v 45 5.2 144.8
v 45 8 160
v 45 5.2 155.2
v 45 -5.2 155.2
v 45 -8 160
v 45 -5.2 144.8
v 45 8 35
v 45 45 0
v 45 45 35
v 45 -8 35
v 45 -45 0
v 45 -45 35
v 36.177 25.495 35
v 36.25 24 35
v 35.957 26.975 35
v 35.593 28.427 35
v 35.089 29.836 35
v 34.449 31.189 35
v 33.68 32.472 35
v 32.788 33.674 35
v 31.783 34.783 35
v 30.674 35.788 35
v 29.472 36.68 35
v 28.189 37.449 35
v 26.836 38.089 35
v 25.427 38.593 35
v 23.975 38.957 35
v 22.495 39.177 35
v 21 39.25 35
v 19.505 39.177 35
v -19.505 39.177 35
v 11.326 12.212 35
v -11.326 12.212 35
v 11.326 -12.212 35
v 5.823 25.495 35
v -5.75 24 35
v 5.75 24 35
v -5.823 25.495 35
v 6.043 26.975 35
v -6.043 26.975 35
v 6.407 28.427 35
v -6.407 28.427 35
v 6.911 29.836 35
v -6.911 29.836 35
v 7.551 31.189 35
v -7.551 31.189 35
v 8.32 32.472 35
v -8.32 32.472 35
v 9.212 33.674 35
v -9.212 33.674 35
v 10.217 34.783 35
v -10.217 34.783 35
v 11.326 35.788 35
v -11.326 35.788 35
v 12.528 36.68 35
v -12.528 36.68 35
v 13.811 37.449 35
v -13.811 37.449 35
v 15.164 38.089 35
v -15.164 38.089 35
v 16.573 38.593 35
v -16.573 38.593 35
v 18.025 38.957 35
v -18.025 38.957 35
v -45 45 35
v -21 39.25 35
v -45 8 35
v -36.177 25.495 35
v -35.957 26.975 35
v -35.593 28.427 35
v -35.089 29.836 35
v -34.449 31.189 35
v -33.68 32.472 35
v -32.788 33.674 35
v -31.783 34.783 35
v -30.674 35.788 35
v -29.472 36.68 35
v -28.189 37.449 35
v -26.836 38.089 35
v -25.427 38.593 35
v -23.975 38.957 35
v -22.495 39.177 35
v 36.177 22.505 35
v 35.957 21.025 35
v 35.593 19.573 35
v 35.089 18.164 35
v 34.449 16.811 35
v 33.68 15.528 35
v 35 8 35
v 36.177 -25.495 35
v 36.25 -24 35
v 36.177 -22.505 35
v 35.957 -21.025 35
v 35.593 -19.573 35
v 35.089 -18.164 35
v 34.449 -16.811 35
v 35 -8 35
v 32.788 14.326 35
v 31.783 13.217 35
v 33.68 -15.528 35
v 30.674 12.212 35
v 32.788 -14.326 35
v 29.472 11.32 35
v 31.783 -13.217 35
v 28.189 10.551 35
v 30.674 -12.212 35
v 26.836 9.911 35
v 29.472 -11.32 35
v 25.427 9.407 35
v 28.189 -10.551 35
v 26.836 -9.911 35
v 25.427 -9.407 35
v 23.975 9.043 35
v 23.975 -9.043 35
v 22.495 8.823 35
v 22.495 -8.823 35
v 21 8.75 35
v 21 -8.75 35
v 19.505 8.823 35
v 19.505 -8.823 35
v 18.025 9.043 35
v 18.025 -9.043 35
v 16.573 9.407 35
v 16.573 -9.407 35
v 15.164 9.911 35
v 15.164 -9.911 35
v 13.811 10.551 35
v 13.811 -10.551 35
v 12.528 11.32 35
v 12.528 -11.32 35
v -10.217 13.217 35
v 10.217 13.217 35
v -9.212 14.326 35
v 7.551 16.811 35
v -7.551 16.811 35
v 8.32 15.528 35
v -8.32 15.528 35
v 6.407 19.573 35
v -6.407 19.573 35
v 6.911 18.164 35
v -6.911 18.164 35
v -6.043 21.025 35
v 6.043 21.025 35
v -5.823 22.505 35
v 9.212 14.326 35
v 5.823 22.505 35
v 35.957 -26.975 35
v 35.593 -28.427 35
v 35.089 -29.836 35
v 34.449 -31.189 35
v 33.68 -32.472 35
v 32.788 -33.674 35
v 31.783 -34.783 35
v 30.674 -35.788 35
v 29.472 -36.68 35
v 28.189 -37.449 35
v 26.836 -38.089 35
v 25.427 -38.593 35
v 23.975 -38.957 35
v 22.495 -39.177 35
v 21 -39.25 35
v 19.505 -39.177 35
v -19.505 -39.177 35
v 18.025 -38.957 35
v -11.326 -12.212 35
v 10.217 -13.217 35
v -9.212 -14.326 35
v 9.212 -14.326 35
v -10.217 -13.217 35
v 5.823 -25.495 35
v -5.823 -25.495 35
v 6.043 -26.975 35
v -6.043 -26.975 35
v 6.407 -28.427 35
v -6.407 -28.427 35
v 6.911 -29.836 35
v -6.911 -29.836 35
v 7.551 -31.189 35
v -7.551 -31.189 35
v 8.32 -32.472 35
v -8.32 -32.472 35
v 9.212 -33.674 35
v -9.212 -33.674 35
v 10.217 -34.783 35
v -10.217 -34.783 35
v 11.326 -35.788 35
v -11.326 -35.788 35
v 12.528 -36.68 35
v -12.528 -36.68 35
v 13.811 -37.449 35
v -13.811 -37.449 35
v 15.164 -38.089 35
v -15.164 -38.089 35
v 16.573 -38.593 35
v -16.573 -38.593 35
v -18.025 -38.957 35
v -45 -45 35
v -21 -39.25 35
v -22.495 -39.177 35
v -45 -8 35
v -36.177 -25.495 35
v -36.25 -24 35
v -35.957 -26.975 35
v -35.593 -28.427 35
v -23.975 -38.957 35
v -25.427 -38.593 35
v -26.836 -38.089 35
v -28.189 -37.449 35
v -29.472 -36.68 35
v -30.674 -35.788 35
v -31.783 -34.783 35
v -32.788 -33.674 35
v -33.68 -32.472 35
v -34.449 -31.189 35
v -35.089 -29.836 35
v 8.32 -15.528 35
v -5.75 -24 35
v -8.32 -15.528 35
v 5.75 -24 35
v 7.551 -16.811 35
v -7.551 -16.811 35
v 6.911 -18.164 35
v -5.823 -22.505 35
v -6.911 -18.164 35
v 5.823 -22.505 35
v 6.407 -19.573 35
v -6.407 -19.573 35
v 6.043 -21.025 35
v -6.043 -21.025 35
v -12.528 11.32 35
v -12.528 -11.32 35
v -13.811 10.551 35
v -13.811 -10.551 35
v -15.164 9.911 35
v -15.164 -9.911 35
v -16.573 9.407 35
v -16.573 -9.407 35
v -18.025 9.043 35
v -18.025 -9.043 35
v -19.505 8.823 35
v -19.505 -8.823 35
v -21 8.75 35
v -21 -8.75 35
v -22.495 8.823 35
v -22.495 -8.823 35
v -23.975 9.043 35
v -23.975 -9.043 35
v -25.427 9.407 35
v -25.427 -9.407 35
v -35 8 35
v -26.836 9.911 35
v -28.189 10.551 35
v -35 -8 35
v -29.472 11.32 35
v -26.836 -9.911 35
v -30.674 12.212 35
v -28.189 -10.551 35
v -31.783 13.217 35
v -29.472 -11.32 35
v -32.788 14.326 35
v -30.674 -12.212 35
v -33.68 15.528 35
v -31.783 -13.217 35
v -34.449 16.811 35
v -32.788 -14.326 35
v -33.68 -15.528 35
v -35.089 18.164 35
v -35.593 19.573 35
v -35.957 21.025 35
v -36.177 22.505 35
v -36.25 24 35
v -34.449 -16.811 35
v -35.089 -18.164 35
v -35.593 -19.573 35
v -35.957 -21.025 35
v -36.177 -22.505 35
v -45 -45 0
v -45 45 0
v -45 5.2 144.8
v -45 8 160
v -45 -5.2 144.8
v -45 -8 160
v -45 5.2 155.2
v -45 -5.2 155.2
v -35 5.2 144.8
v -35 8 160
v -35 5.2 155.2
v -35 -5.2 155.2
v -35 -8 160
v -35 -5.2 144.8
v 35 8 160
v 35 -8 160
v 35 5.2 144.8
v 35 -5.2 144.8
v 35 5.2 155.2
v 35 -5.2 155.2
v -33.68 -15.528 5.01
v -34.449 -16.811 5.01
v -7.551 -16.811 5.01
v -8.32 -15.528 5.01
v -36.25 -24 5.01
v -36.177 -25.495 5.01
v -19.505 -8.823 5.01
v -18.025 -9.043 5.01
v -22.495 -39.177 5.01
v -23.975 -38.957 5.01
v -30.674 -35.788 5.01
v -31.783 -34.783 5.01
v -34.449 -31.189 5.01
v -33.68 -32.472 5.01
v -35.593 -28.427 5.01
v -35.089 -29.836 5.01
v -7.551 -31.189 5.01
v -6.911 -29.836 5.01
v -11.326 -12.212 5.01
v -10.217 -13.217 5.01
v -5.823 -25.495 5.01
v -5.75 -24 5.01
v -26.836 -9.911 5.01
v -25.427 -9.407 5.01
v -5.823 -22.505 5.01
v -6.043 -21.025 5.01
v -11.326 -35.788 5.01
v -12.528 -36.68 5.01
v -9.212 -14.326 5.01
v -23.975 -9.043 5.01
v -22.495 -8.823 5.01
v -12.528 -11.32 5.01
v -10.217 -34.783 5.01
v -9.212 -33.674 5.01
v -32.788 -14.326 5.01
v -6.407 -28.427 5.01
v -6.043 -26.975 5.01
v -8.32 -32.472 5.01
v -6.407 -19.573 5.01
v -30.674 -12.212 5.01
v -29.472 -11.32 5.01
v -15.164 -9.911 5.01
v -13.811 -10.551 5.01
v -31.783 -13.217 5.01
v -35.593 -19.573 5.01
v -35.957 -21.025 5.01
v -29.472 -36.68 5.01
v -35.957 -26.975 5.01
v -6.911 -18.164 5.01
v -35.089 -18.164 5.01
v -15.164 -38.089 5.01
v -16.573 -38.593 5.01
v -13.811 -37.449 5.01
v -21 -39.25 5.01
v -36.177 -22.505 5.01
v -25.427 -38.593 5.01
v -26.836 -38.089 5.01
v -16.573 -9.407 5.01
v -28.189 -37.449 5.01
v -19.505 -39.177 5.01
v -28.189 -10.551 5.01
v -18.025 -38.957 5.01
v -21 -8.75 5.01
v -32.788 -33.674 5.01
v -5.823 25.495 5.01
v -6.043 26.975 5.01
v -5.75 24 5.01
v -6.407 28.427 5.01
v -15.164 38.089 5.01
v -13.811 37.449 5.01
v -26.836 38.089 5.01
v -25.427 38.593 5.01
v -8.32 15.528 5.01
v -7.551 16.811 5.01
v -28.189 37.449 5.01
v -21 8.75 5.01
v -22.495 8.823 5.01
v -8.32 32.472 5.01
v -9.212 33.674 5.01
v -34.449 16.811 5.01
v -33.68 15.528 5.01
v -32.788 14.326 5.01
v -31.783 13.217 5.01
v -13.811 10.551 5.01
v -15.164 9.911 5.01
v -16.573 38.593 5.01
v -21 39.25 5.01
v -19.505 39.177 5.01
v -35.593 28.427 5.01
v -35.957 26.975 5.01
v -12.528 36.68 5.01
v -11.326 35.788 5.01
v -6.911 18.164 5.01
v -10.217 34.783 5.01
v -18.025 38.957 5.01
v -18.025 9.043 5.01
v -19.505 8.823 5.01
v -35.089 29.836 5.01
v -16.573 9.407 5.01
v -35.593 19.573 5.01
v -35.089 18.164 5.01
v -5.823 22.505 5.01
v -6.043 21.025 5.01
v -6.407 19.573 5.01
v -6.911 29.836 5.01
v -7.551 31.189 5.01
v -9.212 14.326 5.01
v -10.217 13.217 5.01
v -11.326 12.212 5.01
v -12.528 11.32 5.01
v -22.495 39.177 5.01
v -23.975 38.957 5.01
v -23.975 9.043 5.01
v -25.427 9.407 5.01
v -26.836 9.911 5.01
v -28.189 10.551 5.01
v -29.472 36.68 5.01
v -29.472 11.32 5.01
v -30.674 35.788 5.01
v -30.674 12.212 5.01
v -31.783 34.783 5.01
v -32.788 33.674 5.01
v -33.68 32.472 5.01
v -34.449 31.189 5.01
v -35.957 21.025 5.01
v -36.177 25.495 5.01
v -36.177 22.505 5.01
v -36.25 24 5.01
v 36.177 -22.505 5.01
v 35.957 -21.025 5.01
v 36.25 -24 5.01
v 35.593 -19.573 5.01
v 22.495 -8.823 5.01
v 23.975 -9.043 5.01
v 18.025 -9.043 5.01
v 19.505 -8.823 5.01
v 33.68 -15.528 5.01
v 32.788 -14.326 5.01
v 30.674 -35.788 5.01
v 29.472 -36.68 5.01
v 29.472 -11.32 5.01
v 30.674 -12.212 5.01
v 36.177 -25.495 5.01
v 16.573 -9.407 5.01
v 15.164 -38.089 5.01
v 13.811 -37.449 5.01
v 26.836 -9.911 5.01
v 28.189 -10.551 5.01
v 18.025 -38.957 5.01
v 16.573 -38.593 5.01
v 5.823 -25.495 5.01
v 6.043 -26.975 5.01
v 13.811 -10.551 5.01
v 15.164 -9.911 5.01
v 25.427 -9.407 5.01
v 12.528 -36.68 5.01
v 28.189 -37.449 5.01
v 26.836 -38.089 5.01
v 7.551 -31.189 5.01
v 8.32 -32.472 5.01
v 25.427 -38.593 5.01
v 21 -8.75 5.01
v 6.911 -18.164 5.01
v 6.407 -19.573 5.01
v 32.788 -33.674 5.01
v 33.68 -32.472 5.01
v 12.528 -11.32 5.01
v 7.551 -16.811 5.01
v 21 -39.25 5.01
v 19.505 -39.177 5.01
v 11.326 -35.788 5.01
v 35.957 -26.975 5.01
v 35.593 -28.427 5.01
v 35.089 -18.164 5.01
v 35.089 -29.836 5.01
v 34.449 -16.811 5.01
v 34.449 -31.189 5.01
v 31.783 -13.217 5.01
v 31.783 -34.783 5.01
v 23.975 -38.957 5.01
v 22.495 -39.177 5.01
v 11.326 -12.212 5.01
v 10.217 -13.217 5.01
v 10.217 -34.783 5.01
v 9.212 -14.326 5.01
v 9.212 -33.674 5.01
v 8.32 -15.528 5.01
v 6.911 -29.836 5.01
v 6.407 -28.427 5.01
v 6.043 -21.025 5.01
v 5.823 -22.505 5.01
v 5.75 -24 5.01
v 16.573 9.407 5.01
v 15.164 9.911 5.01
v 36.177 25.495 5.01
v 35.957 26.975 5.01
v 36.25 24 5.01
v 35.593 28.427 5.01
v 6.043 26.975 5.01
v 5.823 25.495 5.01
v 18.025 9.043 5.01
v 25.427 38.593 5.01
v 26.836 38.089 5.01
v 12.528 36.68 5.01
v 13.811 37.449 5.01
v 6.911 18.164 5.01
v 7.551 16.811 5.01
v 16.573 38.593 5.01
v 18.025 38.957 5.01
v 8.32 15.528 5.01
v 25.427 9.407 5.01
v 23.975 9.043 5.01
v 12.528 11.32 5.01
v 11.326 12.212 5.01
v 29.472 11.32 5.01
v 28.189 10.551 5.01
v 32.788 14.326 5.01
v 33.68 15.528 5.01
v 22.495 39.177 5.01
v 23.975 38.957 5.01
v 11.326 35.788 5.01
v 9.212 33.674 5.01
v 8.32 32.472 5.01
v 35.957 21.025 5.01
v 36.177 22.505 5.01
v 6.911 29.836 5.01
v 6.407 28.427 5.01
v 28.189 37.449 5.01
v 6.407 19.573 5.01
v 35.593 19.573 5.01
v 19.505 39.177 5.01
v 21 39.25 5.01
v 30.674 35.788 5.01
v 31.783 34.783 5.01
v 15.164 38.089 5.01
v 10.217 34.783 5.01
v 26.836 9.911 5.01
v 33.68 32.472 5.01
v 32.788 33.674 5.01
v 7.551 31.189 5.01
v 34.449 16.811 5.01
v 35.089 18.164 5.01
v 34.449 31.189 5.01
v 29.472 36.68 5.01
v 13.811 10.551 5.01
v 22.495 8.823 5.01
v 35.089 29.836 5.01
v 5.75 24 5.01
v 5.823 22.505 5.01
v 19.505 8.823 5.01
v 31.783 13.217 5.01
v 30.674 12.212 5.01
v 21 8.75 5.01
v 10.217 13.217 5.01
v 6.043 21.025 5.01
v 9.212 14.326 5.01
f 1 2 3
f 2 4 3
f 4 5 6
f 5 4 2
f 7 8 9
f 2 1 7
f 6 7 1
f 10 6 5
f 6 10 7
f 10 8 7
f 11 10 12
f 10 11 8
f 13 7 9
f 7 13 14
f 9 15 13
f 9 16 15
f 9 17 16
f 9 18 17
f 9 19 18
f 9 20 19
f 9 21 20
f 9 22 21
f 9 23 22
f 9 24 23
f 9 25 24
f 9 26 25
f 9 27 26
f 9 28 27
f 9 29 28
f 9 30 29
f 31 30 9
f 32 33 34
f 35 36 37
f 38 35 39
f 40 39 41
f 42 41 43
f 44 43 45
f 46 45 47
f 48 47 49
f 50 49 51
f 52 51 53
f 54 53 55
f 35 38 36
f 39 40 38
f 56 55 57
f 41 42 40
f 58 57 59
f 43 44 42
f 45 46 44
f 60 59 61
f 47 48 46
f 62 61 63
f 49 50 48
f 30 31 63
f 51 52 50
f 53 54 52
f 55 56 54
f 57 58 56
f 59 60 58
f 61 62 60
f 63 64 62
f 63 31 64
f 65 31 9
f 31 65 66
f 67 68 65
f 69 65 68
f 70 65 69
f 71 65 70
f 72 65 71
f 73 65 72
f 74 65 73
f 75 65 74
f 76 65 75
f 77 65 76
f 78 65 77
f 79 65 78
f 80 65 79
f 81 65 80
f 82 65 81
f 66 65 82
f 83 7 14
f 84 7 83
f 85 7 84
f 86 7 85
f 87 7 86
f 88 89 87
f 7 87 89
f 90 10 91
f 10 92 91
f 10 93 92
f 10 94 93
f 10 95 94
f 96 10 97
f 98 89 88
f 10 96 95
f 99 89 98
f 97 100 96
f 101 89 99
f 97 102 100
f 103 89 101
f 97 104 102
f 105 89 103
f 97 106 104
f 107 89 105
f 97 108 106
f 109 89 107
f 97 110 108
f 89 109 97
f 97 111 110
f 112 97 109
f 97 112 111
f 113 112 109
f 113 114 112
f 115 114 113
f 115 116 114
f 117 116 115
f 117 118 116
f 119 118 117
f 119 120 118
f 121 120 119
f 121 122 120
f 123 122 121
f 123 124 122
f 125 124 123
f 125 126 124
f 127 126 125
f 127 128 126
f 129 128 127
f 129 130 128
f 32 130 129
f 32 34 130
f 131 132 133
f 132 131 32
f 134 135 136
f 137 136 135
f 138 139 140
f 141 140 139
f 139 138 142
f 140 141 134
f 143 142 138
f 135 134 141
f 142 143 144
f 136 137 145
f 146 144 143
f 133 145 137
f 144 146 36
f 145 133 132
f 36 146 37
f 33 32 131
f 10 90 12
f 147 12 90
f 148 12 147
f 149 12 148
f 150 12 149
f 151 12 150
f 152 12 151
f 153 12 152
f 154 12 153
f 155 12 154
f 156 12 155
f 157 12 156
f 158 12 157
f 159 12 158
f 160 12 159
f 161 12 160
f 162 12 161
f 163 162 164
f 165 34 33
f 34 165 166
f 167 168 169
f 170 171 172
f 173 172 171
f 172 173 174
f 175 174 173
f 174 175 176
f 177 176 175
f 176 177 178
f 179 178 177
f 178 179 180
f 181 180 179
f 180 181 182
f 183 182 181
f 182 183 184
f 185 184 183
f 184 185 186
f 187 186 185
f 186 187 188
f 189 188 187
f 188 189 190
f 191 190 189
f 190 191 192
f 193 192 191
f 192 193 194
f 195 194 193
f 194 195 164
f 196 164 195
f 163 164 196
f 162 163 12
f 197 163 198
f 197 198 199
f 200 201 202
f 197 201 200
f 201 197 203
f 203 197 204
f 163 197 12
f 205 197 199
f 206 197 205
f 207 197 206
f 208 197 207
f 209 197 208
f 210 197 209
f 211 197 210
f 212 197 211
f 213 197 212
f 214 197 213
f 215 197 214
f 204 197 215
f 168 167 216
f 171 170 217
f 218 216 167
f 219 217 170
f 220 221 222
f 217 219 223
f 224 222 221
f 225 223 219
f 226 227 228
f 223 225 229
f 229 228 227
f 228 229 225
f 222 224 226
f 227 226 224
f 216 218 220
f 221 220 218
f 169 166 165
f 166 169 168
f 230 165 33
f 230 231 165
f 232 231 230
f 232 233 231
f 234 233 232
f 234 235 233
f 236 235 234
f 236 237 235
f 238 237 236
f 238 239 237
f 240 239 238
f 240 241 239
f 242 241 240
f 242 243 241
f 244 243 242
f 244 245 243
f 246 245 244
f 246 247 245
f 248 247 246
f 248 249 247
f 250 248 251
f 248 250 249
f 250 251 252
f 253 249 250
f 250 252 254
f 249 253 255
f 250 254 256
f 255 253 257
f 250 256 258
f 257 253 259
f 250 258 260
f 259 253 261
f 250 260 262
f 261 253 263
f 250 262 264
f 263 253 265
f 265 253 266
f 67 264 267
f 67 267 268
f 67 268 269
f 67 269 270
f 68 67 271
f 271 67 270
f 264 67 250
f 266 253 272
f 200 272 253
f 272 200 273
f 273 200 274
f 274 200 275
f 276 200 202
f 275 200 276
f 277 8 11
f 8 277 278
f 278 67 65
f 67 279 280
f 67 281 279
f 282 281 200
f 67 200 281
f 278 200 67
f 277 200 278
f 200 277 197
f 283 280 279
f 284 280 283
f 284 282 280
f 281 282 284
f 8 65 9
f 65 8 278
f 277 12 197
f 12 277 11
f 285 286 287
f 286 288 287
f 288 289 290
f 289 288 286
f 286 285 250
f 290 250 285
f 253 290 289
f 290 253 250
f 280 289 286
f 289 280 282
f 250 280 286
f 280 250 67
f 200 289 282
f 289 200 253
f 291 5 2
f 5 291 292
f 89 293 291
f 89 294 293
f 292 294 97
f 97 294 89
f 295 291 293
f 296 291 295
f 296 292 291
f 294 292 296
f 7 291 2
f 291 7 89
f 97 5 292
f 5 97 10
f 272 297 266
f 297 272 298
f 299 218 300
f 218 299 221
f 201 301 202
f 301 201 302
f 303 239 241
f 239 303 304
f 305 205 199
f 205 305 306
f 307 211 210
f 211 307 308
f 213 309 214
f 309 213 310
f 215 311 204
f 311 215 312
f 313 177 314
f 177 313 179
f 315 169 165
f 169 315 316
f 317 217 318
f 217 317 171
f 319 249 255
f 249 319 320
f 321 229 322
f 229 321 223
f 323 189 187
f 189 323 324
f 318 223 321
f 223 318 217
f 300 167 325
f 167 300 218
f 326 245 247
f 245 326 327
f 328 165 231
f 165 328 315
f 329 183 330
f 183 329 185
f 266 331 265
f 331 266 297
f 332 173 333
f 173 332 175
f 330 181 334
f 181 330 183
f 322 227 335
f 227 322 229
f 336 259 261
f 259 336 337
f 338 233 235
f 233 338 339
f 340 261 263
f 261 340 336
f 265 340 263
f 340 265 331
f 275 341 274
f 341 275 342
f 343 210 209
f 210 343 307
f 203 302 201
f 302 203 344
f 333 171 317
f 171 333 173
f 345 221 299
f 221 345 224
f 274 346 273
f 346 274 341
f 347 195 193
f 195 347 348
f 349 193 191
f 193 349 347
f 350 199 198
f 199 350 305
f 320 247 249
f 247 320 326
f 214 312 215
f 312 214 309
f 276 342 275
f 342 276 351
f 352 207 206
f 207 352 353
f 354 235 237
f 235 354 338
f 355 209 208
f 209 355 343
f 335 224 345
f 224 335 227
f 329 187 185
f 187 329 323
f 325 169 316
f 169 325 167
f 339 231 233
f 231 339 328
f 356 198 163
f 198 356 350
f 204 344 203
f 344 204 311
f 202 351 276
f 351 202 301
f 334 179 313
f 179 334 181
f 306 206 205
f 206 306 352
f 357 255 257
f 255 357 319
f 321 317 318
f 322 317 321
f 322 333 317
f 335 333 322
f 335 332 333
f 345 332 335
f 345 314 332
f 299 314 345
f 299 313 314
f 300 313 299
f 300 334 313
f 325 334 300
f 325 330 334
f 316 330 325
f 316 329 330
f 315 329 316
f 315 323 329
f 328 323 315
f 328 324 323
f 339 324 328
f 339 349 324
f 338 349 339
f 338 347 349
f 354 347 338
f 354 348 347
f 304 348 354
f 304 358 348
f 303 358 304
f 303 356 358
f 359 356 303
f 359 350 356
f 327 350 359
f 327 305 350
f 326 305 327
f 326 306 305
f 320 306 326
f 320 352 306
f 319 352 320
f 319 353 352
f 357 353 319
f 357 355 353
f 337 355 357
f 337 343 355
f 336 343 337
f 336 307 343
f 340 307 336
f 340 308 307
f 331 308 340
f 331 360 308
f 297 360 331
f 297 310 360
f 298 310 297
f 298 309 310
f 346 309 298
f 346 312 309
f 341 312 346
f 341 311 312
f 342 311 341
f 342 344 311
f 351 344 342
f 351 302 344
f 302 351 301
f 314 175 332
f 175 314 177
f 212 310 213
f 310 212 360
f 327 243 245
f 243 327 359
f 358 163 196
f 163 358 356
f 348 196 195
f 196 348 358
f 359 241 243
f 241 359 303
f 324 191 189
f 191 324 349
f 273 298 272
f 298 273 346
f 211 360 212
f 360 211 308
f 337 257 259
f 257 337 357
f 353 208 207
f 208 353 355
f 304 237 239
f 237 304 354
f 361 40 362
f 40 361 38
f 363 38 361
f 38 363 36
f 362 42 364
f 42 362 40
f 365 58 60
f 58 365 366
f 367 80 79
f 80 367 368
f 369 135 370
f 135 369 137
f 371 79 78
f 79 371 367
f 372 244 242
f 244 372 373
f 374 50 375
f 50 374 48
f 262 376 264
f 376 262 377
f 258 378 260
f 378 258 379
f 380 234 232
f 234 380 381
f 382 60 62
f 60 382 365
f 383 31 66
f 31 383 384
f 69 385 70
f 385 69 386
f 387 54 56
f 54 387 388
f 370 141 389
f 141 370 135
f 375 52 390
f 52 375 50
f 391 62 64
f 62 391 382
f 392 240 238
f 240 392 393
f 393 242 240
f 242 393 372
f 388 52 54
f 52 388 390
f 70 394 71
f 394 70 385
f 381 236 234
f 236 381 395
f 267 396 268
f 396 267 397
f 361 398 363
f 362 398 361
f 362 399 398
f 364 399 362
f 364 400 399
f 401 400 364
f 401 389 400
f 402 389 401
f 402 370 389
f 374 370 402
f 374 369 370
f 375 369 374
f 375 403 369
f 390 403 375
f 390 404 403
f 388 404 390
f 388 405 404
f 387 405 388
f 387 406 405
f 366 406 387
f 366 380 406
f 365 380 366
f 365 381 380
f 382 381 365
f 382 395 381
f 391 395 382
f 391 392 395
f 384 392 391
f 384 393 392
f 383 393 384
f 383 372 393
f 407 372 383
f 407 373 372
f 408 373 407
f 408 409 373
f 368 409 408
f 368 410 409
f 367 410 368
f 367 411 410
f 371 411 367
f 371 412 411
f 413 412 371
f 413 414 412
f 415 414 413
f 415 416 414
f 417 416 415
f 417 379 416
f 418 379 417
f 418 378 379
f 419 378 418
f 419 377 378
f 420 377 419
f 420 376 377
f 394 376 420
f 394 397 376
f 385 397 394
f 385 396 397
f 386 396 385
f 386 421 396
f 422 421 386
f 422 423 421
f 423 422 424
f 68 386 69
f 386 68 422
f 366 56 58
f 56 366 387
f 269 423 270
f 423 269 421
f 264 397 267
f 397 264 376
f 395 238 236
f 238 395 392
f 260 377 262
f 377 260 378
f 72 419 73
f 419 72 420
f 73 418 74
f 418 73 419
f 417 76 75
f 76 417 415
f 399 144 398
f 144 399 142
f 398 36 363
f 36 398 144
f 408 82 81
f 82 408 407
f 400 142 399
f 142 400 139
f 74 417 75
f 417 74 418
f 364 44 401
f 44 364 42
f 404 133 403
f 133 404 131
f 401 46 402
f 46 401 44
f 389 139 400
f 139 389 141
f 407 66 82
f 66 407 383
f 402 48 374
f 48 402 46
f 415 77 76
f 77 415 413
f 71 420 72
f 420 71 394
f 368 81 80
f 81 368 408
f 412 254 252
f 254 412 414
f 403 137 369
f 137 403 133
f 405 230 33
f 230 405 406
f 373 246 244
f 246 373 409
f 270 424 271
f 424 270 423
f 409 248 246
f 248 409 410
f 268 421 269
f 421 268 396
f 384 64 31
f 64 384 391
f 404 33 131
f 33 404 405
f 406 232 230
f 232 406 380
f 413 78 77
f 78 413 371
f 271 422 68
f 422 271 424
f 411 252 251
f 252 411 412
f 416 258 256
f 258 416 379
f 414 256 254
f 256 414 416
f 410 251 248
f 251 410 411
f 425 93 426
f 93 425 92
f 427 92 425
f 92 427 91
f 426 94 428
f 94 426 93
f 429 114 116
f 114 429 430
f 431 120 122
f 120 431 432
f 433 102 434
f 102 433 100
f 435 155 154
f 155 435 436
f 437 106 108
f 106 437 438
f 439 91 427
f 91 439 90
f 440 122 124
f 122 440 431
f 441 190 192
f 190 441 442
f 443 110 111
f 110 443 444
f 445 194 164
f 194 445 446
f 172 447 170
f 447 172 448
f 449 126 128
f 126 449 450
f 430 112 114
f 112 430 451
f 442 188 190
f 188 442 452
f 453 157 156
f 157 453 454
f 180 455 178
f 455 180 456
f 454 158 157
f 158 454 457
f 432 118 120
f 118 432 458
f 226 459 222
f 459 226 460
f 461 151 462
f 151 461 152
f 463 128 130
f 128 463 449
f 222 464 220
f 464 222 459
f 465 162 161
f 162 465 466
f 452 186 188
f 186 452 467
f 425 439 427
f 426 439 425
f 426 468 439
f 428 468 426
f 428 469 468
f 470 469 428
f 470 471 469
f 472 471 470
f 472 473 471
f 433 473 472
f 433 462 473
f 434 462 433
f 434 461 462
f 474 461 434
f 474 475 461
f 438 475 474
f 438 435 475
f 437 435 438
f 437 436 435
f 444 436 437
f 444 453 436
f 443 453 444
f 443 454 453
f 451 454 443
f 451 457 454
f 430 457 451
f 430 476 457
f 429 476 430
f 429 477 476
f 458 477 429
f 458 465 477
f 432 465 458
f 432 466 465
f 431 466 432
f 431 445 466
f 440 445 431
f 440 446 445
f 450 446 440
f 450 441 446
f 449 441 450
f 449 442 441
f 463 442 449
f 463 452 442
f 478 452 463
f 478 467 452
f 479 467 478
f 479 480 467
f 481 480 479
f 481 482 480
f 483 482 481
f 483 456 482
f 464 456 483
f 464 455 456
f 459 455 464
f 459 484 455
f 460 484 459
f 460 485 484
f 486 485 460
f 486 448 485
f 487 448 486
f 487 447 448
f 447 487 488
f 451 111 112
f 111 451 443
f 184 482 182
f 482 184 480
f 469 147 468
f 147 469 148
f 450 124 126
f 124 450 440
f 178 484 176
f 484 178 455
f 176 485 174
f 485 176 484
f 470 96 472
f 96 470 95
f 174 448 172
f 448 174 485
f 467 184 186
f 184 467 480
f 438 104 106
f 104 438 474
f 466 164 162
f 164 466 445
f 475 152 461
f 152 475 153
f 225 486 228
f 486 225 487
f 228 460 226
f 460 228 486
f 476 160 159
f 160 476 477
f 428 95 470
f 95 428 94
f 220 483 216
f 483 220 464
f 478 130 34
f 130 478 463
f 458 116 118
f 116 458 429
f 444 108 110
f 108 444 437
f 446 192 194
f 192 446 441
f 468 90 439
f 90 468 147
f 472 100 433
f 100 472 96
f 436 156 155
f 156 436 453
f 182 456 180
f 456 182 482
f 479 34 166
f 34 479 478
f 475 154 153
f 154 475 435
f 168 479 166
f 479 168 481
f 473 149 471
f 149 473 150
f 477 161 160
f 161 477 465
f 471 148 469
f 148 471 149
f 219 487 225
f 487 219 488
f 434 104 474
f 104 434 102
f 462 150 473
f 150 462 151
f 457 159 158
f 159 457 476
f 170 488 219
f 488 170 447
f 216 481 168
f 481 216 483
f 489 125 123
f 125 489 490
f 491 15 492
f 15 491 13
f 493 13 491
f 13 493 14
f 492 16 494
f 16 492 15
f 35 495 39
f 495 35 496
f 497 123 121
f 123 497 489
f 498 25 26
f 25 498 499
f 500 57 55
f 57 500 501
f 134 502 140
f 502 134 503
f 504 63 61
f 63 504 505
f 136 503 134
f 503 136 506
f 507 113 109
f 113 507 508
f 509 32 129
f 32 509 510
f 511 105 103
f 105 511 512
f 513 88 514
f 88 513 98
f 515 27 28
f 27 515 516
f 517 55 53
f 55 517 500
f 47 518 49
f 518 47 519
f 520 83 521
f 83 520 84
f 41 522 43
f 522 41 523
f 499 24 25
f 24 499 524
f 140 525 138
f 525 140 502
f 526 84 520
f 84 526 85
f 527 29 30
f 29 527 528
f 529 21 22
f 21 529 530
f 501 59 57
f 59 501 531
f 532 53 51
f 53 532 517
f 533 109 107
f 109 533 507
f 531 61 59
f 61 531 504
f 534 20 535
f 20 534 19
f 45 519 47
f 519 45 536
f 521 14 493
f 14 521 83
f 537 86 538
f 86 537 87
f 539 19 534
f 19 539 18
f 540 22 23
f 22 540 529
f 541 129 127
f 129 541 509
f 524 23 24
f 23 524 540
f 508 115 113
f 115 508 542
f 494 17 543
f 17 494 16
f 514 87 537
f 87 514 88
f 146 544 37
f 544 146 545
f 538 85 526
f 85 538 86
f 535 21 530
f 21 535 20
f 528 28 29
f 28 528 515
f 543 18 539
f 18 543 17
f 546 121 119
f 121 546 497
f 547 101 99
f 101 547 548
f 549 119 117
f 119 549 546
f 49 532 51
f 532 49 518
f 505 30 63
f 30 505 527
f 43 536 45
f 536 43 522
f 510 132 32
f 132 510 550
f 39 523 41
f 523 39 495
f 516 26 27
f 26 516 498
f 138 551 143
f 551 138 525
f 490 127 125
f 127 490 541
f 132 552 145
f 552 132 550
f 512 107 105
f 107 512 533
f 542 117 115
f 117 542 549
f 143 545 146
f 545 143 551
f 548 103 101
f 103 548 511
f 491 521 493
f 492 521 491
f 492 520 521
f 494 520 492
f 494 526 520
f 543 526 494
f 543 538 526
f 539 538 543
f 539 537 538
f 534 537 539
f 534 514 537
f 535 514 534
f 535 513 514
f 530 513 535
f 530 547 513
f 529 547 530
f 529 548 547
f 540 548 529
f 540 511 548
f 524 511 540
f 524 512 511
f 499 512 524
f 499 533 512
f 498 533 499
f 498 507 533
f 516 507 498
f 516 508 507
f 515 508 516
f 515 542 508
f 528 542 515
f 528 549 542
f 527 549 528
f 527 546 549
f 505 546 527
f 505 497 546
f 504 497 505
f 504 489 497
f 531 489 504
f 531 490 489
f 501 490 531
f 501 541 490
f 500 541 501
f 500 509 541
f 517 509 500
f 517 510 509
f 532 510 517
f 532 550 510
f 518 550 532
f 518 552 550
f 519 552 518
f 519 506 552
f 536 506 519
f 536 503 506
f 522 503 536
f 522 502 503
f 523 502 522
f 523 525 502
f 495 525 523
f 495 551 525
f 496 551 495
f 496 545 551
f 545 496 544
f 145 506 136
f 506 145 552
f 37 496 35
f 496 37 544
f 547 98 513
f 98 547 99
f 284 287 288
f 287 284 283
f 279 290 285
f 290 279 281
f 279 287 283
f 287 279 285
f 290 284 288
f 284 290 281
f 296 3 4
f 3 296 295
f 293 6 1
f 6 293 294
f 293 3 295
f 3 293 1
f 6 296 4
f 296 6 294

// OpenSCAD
// Part 1: Base block with tube seats and vertical posts
// Part 2: Handle bar to be slid through the posts

// --- Dimensions Part 1 ---
base_x      = 90;    // Base length (X)
base_y      = 90;    // Base width (Y)
base_z      = 35;    // Base height (Z)

seat_d      = 30.5;  // Diameter of tube seats
seat_depth  = 30;    // Depth of tube seats
seat_floor  = 5;     // Remaining floor thickness (35 - 30)

seat_x_pos  = 21;    // X offset for seats
seat_y_pos  = 24;    // Y offset for seats

post_x_thick = 10;   // Thickness of posts (X dimension)
post_y_wide  = 16;   // Width of posts (Y dimension)
post_z_total  = 160; // Total height from Z=0

hole_sq_d    = 10.4; // Square hole dimension
hole_sq_z    = 150;  // Z height of the square hole center

// --- Dimensions Part 2 ---
handle_x     = 100;  // Length of handle (X)
handle_w     = 10;   // Width of handle (Y)
handle_h     = 10;   // Height of handle (Z)
handle_y_min  = 55;  // Y position start (55 to 65)
handle_y_max  = 65;

$fn = 64;

// --- Part 1: Base and Posts ---
module part_1() {
    difference() {
        union() {
            // Main Base Block
            translate([-base_x/2, -base_y/2, 0])
                cube([base_x, base_y, base_z]);
            
            // Post 1 (at -X end)
            // Positioned flush with end faces: X from -45 to -35
            translate([-base_x/2, -post_y_wide/2, base_z])
                cube([post_x_thick, post_y_wide, post_z_total - base_z]);
            
            // Post 2 (at +X end)
            // Positioned flush with end faces: X from 35 to 45
            translate([base_x/2 - post_x_thick, -post_y_wide/2, base_z])
                cube([post_x_thick, post_y_wide, post_z_total - base_z]);
        }

        // Tube Seats (Blind holes)
        // Seats are centered at x = +/- 21, y = +/- 24
        for (sx = [-seat_x_pos, seat_x_pos]) {
            for (sy = [-seat_y_pos, seat_y_pos]) {
                // Subtract 0.01 to ensure clean cut through the top face
                translate([sx, sy, base_z - seat_depth + 0.01])
                    cylinder(h = seat_depth + 0.02, d = seat_d);
            }
        }

        // Square holes through posts
        // Centered at z = 150.
        // Post 1 X range: [-45, -35]. Post 2 X range: [35, 45].
        
        // Hole 1 (Left Post)
        translate([-base_x/2 - 1, -hole_sq_d/2, hole_sq_z - hole_sq_d/2])
            cube([post_x_thick + 2, hole_sq_d, hole_sq_d]);
            
        // Hole 2 (Right Post)
        translate([base_x/2 - post_x_thick - 1, -hole_sq_d/2, hole_sq_z - hole_sq_d/2])
            cube([post_x_thick + 2, hole_sq_d, hole_sq_d]);
    }
}

// --- Part 2: Handle ---
module part_2() {
    // The handle is a 10x10x100 bar.
    // It is centered on X (0), and spans Y from 55 to 65.
    // It lies on the bed (Z=0).
    translate([-handle_x/2, handle_y_min, 0])
        cube([handle_x, handle_w, handle_h]);
}

// --- Rendering ---
// To print Part 1:
part_1();

// To print Part 2 (uncomment below and comment part_1 above):
// part_2();

// To view both together (separated in Y for clarity, both on bed):
// part_1();
// translate([0, 100, 0]) part_2();
